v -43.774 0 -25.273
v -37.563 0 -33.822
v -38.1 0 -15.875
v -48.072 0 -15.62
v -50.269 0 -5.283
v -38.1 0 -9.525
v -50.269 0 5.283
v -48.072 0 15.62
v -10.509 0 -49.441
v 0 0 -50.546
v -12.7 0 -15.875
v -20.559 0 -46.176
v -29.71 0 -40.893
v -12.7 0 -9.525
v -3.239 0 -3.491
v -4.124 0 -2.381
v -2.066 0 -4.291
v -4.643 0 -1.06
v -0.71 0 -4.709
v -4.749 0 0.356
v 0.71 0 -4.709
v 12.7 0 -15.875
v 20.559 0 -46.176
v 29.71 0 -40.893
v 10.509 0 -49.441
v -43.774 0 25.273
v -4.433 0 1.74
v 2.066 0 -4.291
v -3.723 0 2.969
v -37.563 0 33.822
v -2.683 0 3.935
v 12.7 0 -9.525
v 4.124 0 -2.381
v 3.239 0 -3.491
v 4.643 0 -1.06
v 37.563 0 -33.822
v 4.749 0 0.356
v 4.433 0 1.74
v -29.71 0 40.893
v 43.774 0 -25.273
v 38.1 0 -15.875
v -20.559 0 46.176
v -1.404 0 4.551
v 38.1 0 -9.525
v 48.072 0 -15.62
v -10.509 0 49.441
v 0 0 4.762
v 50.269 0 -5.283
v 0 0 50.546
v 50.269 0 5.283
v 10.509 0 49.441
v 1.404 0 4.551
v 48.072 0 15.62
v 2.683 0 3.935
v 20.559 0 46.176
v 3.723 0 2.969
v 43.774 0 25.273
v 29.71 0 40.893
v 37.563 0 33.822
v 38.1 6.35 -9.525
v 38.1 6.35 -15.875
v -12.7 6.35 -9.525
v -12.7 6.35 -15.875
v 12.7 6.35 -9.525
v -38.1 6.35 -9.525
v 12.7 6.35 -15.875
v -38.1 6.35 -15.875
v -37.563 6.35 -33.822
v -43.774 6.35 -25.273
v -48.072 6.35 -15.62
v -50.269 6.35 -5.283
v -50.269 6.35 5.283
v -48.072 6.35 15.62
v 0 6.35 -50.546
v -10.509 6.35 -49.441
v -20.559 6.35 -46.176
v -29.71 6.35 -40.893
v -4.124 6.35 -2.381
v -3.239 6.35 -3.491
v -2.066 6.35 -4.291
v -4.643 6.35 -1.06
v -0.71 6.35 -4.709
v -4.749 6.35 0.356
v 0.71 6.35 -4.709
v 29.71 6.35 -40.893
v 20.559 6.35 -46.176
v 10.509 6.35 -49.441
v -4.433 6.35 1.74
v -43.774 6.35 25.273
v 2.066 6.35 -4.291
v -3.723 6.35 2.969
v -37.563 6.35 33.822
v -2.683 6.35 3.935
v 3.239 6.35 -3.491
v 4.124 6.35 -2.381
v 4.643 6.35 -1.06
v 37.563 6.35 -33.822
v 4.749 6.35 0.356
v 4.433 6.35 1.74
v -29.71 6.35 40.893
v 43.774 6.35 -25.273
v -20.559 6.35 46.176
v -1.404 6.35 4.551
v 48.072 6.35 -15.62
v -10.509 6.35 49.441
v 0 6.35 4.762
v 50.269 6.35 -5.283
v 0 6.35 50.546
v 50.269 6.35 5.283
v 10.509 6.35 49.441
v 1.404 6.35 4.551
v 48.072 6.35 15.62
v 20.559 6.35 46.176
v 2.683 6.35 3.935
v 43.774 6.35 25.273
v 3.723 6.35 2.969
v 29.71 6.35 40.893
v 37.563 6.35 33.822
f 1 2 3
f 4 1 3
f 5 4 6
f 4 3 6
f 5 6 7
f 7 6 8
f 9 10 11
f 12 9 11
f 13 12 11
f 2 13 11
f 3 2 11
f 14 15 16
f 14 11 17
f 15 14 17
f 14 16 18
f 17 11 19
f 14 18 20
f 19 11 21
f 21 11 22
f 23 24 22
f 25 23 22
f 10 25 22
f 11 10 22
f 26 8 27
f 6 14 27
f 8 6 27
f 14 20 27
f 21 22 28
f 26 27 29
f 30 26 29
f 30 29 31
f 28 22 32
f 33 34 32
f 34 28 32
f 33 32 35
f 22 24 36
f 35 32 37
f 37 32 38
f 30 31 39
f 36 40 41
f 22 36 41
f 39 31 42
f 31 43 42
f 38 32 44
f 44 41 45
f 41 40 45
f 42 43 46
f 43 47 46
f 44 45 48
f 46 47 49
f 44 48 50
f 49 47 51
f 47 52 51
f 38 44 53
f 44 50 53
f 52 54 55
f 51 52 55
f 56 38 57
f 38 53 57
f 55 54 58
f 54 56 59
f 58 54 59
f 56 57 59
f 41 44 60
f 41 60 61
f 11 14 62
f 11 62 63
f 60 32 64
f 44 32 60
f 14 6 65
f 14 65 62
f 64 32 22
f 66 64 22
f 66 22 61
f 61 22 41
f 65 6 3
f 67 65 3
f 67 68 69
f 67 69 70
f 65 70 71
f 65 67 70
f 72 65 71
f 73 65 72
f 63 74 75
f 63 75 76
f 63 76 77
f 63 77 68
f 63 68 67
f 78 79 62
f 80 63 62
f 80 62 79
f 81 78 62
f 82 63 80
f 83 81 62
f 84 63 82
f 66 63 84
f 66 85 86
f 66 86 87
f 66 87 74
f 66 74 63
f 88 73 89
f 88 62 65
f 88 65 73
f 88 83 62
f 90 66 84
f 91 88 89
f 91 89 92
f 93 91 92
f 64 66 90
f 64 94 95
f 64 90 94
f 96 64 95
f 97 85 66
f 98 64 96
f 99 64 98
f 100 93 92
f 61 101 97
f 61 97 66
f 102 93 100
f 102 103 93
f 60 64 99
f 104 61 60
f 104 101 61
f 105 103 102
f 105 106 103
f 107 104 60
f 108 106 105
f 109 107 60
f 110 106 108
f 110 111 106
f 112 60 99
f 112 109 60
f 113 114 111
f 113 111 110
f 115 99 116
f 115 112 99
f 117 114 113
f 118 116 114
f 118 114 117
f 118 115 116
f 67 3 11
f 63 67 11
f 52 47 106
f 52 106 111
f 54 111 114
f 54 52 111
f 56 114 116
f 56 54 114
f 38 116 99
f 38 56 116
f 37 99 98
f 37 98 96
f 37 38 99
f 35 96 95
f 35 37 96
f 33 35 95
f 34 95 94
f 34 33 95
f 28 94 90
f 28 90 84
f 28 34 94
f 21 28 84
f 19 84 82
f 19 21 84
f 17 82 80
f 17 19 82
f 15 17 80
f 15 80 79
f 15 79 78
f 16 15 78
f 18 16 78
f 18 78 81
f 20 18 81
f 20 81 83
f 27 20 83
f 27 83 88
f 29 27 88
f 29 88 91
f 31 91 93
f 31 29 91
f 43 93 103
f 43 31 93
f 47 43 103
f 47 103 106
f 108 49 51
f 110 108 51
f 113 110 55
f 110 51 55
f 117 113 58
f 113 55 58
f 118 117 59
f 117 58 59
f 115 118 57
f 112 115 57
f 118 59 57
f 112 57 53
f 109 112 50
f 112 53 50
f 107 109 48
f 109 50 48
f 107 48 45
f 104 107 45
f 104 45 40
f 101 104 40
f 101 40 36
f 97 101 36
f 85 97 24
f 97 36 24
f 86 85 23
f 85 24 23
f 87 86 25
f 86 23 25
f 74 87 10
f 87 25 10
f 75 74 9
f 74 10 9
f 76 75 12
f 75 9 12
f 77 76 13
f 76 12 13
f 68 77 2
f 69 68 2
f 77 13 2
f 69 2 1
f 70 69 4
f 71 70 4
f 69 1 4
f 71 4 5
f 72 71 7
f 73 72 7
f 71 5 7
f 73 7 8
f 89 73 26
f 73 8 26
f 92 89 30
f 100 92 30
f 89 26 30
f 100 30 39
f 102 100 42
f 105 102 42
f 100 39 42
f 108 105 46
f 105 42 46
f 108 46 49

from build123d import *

# Parameters (mm, degrees)
SKETCH1_R           = 50.546
SKETCH1_R_2         = 4.7625
SKETCH1_W           = 25.4
SKETCH1_H           = 6.35
BOSS_EXTRUDE1_DEPTH = 6.35


with BuildPart() as part:
    # Sketch1 → Boss-Extrude1 (new body)
    with BuildSketch(Plane(origin=(0, 0, 0), x_dir=(1, 0, 0), z_dir=(0, 1, 0))):
        with Locations(Location((0, 0, 0), (0, 0, 270))):
            Circle(SKETCH1_R)
        with Locations(Location((0, 0, 0), (0, 0, 270))):
            Circle(SKETCH1_R_2, mode=Mode.SUBTRACT)
        with Locations((-25.4, 12.7)):
            Rectangle(SKETCH1_W, SKETCH1_H, mode=Mode.SUBTRACT)
        with Locations((25.4, 12.7)):
            Rectangle(SKETCH1_W, SKETCH1_H, mode=Mode.SUBTRACT)
    extrude(amount=BOSS_EXTRUDE1_DEPTH)


solid = part.part
